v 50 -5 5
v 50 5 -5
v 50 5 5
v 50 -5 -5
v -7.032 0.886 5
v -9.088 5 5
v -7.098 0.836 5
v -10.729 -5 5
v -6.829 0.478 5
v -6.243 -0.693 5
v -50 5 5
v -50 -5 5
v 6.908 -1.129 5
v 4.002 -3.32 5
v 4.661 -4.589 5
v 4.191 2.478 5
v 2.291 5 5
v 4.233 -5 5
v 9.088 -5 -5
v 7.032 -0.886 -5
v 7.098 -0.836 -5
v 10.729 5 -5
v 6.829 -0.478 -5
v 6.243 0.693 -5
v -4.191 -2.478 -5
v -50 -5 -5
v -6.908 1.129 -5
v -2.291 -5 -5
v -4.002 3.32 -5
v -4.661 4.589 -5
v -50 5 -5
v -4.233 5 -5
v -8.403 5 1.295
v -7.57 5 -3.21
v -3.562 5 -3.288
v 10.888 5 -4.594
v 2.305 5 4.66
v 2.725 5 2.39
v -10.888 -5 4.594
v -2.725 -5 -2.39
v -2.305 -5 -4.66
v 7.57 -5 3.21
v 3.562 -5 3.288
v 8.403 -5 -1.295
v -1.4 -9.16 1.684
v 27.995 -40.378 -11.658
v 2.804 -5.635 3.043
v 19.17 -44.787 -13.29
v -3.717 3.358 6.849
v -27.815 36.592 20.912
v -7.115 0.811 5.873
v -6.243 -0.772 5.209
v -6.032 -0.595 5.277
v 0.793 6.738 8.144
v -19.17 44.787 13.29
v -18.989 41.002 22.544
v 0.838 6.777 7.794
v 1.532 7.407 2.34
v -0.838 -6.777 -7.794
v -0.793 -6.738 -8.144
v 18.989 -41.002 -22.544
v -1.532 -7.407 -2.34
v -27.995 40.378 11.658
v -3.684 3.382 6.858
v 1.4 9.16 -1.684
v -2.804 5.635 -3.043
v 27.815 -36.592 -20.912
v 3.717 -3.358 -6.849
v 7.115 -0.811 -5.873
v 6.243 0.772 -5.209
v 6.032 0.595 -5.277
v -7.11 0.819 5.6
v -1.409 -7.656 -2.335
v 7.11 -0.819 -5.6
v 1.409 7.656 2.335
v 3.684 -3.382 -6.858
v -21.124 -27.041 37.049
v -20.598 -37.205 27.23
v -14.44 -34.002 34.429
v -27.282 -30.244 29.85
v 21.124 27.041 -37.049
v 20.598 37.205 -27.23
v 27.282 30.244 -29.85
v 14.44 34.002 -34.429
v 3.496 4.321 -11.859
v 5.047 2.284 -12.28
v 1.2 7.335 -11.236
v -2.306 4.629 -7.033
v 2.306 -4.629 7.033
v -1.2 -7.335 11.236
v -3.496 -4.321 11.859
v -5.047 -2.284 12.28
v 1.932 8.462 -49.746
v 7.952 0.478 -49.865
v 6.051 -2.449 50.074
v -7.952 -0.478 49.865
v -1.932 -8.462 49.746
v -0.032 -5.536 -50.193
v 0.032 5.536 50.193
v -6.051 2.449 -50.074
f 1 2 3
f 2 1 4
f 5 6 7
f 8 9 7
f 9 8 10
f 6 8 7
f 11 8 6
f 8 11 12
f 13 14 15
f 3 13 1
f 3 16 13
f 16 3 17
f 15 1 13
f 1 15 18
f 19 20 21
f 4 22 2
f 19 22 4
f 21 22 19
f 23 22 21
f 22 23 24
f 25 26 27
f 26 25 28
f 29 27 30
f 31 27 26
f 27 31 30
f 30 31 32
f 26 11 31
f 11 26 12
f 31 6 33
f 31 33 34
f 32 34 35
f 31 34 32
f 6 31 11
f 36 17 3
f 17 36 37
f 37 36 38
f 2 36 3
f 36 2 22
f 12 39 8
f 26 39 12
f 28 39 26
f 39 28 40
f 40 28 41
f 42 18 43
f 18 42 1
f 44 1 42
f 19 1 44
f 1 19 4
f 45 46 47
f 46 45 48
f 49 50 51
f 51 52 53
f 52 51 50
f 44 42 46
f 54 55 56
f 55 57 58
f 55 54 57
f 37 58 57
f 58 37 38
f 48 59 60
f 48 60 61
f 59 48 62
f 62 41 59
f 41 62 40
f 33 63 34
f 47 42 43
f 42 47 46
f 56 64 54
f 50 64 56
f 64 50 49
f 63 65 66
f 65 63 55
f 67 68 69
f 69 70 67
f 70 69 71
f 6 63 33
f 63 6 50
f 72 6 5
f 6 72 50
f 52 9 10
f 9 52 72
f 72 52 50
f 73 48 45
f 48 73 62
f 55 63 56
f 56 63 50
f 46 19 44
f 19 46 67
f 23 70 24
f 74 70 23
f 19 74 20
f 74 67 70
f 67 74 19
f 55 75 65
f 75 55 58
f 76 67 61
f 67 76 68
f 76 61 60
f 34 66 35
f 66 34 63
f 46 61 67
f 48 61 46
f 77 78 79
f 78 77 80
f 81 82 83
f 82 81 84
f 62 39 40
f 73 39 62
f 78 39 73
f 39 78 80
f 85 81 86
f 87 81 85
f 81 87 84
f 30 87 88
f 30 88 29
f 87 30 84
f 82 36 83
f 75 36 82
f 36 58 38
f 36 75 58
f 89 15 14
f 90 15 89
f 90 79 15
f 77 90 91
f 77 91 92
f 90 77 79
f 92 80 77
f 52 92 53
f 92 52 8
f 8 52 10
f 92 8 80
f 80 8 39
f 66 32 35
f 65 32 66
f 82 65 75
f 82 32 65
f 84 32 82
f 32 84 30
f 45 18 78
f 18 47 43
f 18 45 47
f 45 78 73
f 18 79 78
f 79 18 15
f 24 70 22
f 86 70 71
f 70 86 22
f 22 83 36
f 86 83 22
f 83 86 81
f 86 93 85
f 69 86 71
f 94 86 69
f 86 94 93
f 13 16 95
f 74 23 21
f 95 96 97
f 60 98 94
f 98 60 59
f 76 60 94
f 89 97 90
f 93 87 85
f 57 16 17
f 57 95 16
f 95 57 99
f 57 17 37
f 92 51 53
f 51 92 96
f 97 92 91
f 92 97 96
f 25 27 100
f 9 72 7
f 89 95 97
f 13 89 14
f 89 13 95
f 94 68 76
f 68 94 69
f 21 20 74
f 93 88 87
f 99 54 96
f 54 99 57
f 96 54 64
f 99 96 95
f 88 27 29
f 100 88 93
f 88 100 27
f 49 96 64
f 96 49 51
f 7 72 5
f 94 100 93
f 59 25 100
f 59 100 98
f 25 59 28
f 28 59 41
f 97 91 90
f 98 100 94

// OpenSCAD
for (i = [[ 0, 0, 0],
		  [10, 20, 300],
		  [200, 40, 57],
		  [20, 88, 57]]) {

	rotate(i)
	cube([100, 10, 10], center=true);
}
